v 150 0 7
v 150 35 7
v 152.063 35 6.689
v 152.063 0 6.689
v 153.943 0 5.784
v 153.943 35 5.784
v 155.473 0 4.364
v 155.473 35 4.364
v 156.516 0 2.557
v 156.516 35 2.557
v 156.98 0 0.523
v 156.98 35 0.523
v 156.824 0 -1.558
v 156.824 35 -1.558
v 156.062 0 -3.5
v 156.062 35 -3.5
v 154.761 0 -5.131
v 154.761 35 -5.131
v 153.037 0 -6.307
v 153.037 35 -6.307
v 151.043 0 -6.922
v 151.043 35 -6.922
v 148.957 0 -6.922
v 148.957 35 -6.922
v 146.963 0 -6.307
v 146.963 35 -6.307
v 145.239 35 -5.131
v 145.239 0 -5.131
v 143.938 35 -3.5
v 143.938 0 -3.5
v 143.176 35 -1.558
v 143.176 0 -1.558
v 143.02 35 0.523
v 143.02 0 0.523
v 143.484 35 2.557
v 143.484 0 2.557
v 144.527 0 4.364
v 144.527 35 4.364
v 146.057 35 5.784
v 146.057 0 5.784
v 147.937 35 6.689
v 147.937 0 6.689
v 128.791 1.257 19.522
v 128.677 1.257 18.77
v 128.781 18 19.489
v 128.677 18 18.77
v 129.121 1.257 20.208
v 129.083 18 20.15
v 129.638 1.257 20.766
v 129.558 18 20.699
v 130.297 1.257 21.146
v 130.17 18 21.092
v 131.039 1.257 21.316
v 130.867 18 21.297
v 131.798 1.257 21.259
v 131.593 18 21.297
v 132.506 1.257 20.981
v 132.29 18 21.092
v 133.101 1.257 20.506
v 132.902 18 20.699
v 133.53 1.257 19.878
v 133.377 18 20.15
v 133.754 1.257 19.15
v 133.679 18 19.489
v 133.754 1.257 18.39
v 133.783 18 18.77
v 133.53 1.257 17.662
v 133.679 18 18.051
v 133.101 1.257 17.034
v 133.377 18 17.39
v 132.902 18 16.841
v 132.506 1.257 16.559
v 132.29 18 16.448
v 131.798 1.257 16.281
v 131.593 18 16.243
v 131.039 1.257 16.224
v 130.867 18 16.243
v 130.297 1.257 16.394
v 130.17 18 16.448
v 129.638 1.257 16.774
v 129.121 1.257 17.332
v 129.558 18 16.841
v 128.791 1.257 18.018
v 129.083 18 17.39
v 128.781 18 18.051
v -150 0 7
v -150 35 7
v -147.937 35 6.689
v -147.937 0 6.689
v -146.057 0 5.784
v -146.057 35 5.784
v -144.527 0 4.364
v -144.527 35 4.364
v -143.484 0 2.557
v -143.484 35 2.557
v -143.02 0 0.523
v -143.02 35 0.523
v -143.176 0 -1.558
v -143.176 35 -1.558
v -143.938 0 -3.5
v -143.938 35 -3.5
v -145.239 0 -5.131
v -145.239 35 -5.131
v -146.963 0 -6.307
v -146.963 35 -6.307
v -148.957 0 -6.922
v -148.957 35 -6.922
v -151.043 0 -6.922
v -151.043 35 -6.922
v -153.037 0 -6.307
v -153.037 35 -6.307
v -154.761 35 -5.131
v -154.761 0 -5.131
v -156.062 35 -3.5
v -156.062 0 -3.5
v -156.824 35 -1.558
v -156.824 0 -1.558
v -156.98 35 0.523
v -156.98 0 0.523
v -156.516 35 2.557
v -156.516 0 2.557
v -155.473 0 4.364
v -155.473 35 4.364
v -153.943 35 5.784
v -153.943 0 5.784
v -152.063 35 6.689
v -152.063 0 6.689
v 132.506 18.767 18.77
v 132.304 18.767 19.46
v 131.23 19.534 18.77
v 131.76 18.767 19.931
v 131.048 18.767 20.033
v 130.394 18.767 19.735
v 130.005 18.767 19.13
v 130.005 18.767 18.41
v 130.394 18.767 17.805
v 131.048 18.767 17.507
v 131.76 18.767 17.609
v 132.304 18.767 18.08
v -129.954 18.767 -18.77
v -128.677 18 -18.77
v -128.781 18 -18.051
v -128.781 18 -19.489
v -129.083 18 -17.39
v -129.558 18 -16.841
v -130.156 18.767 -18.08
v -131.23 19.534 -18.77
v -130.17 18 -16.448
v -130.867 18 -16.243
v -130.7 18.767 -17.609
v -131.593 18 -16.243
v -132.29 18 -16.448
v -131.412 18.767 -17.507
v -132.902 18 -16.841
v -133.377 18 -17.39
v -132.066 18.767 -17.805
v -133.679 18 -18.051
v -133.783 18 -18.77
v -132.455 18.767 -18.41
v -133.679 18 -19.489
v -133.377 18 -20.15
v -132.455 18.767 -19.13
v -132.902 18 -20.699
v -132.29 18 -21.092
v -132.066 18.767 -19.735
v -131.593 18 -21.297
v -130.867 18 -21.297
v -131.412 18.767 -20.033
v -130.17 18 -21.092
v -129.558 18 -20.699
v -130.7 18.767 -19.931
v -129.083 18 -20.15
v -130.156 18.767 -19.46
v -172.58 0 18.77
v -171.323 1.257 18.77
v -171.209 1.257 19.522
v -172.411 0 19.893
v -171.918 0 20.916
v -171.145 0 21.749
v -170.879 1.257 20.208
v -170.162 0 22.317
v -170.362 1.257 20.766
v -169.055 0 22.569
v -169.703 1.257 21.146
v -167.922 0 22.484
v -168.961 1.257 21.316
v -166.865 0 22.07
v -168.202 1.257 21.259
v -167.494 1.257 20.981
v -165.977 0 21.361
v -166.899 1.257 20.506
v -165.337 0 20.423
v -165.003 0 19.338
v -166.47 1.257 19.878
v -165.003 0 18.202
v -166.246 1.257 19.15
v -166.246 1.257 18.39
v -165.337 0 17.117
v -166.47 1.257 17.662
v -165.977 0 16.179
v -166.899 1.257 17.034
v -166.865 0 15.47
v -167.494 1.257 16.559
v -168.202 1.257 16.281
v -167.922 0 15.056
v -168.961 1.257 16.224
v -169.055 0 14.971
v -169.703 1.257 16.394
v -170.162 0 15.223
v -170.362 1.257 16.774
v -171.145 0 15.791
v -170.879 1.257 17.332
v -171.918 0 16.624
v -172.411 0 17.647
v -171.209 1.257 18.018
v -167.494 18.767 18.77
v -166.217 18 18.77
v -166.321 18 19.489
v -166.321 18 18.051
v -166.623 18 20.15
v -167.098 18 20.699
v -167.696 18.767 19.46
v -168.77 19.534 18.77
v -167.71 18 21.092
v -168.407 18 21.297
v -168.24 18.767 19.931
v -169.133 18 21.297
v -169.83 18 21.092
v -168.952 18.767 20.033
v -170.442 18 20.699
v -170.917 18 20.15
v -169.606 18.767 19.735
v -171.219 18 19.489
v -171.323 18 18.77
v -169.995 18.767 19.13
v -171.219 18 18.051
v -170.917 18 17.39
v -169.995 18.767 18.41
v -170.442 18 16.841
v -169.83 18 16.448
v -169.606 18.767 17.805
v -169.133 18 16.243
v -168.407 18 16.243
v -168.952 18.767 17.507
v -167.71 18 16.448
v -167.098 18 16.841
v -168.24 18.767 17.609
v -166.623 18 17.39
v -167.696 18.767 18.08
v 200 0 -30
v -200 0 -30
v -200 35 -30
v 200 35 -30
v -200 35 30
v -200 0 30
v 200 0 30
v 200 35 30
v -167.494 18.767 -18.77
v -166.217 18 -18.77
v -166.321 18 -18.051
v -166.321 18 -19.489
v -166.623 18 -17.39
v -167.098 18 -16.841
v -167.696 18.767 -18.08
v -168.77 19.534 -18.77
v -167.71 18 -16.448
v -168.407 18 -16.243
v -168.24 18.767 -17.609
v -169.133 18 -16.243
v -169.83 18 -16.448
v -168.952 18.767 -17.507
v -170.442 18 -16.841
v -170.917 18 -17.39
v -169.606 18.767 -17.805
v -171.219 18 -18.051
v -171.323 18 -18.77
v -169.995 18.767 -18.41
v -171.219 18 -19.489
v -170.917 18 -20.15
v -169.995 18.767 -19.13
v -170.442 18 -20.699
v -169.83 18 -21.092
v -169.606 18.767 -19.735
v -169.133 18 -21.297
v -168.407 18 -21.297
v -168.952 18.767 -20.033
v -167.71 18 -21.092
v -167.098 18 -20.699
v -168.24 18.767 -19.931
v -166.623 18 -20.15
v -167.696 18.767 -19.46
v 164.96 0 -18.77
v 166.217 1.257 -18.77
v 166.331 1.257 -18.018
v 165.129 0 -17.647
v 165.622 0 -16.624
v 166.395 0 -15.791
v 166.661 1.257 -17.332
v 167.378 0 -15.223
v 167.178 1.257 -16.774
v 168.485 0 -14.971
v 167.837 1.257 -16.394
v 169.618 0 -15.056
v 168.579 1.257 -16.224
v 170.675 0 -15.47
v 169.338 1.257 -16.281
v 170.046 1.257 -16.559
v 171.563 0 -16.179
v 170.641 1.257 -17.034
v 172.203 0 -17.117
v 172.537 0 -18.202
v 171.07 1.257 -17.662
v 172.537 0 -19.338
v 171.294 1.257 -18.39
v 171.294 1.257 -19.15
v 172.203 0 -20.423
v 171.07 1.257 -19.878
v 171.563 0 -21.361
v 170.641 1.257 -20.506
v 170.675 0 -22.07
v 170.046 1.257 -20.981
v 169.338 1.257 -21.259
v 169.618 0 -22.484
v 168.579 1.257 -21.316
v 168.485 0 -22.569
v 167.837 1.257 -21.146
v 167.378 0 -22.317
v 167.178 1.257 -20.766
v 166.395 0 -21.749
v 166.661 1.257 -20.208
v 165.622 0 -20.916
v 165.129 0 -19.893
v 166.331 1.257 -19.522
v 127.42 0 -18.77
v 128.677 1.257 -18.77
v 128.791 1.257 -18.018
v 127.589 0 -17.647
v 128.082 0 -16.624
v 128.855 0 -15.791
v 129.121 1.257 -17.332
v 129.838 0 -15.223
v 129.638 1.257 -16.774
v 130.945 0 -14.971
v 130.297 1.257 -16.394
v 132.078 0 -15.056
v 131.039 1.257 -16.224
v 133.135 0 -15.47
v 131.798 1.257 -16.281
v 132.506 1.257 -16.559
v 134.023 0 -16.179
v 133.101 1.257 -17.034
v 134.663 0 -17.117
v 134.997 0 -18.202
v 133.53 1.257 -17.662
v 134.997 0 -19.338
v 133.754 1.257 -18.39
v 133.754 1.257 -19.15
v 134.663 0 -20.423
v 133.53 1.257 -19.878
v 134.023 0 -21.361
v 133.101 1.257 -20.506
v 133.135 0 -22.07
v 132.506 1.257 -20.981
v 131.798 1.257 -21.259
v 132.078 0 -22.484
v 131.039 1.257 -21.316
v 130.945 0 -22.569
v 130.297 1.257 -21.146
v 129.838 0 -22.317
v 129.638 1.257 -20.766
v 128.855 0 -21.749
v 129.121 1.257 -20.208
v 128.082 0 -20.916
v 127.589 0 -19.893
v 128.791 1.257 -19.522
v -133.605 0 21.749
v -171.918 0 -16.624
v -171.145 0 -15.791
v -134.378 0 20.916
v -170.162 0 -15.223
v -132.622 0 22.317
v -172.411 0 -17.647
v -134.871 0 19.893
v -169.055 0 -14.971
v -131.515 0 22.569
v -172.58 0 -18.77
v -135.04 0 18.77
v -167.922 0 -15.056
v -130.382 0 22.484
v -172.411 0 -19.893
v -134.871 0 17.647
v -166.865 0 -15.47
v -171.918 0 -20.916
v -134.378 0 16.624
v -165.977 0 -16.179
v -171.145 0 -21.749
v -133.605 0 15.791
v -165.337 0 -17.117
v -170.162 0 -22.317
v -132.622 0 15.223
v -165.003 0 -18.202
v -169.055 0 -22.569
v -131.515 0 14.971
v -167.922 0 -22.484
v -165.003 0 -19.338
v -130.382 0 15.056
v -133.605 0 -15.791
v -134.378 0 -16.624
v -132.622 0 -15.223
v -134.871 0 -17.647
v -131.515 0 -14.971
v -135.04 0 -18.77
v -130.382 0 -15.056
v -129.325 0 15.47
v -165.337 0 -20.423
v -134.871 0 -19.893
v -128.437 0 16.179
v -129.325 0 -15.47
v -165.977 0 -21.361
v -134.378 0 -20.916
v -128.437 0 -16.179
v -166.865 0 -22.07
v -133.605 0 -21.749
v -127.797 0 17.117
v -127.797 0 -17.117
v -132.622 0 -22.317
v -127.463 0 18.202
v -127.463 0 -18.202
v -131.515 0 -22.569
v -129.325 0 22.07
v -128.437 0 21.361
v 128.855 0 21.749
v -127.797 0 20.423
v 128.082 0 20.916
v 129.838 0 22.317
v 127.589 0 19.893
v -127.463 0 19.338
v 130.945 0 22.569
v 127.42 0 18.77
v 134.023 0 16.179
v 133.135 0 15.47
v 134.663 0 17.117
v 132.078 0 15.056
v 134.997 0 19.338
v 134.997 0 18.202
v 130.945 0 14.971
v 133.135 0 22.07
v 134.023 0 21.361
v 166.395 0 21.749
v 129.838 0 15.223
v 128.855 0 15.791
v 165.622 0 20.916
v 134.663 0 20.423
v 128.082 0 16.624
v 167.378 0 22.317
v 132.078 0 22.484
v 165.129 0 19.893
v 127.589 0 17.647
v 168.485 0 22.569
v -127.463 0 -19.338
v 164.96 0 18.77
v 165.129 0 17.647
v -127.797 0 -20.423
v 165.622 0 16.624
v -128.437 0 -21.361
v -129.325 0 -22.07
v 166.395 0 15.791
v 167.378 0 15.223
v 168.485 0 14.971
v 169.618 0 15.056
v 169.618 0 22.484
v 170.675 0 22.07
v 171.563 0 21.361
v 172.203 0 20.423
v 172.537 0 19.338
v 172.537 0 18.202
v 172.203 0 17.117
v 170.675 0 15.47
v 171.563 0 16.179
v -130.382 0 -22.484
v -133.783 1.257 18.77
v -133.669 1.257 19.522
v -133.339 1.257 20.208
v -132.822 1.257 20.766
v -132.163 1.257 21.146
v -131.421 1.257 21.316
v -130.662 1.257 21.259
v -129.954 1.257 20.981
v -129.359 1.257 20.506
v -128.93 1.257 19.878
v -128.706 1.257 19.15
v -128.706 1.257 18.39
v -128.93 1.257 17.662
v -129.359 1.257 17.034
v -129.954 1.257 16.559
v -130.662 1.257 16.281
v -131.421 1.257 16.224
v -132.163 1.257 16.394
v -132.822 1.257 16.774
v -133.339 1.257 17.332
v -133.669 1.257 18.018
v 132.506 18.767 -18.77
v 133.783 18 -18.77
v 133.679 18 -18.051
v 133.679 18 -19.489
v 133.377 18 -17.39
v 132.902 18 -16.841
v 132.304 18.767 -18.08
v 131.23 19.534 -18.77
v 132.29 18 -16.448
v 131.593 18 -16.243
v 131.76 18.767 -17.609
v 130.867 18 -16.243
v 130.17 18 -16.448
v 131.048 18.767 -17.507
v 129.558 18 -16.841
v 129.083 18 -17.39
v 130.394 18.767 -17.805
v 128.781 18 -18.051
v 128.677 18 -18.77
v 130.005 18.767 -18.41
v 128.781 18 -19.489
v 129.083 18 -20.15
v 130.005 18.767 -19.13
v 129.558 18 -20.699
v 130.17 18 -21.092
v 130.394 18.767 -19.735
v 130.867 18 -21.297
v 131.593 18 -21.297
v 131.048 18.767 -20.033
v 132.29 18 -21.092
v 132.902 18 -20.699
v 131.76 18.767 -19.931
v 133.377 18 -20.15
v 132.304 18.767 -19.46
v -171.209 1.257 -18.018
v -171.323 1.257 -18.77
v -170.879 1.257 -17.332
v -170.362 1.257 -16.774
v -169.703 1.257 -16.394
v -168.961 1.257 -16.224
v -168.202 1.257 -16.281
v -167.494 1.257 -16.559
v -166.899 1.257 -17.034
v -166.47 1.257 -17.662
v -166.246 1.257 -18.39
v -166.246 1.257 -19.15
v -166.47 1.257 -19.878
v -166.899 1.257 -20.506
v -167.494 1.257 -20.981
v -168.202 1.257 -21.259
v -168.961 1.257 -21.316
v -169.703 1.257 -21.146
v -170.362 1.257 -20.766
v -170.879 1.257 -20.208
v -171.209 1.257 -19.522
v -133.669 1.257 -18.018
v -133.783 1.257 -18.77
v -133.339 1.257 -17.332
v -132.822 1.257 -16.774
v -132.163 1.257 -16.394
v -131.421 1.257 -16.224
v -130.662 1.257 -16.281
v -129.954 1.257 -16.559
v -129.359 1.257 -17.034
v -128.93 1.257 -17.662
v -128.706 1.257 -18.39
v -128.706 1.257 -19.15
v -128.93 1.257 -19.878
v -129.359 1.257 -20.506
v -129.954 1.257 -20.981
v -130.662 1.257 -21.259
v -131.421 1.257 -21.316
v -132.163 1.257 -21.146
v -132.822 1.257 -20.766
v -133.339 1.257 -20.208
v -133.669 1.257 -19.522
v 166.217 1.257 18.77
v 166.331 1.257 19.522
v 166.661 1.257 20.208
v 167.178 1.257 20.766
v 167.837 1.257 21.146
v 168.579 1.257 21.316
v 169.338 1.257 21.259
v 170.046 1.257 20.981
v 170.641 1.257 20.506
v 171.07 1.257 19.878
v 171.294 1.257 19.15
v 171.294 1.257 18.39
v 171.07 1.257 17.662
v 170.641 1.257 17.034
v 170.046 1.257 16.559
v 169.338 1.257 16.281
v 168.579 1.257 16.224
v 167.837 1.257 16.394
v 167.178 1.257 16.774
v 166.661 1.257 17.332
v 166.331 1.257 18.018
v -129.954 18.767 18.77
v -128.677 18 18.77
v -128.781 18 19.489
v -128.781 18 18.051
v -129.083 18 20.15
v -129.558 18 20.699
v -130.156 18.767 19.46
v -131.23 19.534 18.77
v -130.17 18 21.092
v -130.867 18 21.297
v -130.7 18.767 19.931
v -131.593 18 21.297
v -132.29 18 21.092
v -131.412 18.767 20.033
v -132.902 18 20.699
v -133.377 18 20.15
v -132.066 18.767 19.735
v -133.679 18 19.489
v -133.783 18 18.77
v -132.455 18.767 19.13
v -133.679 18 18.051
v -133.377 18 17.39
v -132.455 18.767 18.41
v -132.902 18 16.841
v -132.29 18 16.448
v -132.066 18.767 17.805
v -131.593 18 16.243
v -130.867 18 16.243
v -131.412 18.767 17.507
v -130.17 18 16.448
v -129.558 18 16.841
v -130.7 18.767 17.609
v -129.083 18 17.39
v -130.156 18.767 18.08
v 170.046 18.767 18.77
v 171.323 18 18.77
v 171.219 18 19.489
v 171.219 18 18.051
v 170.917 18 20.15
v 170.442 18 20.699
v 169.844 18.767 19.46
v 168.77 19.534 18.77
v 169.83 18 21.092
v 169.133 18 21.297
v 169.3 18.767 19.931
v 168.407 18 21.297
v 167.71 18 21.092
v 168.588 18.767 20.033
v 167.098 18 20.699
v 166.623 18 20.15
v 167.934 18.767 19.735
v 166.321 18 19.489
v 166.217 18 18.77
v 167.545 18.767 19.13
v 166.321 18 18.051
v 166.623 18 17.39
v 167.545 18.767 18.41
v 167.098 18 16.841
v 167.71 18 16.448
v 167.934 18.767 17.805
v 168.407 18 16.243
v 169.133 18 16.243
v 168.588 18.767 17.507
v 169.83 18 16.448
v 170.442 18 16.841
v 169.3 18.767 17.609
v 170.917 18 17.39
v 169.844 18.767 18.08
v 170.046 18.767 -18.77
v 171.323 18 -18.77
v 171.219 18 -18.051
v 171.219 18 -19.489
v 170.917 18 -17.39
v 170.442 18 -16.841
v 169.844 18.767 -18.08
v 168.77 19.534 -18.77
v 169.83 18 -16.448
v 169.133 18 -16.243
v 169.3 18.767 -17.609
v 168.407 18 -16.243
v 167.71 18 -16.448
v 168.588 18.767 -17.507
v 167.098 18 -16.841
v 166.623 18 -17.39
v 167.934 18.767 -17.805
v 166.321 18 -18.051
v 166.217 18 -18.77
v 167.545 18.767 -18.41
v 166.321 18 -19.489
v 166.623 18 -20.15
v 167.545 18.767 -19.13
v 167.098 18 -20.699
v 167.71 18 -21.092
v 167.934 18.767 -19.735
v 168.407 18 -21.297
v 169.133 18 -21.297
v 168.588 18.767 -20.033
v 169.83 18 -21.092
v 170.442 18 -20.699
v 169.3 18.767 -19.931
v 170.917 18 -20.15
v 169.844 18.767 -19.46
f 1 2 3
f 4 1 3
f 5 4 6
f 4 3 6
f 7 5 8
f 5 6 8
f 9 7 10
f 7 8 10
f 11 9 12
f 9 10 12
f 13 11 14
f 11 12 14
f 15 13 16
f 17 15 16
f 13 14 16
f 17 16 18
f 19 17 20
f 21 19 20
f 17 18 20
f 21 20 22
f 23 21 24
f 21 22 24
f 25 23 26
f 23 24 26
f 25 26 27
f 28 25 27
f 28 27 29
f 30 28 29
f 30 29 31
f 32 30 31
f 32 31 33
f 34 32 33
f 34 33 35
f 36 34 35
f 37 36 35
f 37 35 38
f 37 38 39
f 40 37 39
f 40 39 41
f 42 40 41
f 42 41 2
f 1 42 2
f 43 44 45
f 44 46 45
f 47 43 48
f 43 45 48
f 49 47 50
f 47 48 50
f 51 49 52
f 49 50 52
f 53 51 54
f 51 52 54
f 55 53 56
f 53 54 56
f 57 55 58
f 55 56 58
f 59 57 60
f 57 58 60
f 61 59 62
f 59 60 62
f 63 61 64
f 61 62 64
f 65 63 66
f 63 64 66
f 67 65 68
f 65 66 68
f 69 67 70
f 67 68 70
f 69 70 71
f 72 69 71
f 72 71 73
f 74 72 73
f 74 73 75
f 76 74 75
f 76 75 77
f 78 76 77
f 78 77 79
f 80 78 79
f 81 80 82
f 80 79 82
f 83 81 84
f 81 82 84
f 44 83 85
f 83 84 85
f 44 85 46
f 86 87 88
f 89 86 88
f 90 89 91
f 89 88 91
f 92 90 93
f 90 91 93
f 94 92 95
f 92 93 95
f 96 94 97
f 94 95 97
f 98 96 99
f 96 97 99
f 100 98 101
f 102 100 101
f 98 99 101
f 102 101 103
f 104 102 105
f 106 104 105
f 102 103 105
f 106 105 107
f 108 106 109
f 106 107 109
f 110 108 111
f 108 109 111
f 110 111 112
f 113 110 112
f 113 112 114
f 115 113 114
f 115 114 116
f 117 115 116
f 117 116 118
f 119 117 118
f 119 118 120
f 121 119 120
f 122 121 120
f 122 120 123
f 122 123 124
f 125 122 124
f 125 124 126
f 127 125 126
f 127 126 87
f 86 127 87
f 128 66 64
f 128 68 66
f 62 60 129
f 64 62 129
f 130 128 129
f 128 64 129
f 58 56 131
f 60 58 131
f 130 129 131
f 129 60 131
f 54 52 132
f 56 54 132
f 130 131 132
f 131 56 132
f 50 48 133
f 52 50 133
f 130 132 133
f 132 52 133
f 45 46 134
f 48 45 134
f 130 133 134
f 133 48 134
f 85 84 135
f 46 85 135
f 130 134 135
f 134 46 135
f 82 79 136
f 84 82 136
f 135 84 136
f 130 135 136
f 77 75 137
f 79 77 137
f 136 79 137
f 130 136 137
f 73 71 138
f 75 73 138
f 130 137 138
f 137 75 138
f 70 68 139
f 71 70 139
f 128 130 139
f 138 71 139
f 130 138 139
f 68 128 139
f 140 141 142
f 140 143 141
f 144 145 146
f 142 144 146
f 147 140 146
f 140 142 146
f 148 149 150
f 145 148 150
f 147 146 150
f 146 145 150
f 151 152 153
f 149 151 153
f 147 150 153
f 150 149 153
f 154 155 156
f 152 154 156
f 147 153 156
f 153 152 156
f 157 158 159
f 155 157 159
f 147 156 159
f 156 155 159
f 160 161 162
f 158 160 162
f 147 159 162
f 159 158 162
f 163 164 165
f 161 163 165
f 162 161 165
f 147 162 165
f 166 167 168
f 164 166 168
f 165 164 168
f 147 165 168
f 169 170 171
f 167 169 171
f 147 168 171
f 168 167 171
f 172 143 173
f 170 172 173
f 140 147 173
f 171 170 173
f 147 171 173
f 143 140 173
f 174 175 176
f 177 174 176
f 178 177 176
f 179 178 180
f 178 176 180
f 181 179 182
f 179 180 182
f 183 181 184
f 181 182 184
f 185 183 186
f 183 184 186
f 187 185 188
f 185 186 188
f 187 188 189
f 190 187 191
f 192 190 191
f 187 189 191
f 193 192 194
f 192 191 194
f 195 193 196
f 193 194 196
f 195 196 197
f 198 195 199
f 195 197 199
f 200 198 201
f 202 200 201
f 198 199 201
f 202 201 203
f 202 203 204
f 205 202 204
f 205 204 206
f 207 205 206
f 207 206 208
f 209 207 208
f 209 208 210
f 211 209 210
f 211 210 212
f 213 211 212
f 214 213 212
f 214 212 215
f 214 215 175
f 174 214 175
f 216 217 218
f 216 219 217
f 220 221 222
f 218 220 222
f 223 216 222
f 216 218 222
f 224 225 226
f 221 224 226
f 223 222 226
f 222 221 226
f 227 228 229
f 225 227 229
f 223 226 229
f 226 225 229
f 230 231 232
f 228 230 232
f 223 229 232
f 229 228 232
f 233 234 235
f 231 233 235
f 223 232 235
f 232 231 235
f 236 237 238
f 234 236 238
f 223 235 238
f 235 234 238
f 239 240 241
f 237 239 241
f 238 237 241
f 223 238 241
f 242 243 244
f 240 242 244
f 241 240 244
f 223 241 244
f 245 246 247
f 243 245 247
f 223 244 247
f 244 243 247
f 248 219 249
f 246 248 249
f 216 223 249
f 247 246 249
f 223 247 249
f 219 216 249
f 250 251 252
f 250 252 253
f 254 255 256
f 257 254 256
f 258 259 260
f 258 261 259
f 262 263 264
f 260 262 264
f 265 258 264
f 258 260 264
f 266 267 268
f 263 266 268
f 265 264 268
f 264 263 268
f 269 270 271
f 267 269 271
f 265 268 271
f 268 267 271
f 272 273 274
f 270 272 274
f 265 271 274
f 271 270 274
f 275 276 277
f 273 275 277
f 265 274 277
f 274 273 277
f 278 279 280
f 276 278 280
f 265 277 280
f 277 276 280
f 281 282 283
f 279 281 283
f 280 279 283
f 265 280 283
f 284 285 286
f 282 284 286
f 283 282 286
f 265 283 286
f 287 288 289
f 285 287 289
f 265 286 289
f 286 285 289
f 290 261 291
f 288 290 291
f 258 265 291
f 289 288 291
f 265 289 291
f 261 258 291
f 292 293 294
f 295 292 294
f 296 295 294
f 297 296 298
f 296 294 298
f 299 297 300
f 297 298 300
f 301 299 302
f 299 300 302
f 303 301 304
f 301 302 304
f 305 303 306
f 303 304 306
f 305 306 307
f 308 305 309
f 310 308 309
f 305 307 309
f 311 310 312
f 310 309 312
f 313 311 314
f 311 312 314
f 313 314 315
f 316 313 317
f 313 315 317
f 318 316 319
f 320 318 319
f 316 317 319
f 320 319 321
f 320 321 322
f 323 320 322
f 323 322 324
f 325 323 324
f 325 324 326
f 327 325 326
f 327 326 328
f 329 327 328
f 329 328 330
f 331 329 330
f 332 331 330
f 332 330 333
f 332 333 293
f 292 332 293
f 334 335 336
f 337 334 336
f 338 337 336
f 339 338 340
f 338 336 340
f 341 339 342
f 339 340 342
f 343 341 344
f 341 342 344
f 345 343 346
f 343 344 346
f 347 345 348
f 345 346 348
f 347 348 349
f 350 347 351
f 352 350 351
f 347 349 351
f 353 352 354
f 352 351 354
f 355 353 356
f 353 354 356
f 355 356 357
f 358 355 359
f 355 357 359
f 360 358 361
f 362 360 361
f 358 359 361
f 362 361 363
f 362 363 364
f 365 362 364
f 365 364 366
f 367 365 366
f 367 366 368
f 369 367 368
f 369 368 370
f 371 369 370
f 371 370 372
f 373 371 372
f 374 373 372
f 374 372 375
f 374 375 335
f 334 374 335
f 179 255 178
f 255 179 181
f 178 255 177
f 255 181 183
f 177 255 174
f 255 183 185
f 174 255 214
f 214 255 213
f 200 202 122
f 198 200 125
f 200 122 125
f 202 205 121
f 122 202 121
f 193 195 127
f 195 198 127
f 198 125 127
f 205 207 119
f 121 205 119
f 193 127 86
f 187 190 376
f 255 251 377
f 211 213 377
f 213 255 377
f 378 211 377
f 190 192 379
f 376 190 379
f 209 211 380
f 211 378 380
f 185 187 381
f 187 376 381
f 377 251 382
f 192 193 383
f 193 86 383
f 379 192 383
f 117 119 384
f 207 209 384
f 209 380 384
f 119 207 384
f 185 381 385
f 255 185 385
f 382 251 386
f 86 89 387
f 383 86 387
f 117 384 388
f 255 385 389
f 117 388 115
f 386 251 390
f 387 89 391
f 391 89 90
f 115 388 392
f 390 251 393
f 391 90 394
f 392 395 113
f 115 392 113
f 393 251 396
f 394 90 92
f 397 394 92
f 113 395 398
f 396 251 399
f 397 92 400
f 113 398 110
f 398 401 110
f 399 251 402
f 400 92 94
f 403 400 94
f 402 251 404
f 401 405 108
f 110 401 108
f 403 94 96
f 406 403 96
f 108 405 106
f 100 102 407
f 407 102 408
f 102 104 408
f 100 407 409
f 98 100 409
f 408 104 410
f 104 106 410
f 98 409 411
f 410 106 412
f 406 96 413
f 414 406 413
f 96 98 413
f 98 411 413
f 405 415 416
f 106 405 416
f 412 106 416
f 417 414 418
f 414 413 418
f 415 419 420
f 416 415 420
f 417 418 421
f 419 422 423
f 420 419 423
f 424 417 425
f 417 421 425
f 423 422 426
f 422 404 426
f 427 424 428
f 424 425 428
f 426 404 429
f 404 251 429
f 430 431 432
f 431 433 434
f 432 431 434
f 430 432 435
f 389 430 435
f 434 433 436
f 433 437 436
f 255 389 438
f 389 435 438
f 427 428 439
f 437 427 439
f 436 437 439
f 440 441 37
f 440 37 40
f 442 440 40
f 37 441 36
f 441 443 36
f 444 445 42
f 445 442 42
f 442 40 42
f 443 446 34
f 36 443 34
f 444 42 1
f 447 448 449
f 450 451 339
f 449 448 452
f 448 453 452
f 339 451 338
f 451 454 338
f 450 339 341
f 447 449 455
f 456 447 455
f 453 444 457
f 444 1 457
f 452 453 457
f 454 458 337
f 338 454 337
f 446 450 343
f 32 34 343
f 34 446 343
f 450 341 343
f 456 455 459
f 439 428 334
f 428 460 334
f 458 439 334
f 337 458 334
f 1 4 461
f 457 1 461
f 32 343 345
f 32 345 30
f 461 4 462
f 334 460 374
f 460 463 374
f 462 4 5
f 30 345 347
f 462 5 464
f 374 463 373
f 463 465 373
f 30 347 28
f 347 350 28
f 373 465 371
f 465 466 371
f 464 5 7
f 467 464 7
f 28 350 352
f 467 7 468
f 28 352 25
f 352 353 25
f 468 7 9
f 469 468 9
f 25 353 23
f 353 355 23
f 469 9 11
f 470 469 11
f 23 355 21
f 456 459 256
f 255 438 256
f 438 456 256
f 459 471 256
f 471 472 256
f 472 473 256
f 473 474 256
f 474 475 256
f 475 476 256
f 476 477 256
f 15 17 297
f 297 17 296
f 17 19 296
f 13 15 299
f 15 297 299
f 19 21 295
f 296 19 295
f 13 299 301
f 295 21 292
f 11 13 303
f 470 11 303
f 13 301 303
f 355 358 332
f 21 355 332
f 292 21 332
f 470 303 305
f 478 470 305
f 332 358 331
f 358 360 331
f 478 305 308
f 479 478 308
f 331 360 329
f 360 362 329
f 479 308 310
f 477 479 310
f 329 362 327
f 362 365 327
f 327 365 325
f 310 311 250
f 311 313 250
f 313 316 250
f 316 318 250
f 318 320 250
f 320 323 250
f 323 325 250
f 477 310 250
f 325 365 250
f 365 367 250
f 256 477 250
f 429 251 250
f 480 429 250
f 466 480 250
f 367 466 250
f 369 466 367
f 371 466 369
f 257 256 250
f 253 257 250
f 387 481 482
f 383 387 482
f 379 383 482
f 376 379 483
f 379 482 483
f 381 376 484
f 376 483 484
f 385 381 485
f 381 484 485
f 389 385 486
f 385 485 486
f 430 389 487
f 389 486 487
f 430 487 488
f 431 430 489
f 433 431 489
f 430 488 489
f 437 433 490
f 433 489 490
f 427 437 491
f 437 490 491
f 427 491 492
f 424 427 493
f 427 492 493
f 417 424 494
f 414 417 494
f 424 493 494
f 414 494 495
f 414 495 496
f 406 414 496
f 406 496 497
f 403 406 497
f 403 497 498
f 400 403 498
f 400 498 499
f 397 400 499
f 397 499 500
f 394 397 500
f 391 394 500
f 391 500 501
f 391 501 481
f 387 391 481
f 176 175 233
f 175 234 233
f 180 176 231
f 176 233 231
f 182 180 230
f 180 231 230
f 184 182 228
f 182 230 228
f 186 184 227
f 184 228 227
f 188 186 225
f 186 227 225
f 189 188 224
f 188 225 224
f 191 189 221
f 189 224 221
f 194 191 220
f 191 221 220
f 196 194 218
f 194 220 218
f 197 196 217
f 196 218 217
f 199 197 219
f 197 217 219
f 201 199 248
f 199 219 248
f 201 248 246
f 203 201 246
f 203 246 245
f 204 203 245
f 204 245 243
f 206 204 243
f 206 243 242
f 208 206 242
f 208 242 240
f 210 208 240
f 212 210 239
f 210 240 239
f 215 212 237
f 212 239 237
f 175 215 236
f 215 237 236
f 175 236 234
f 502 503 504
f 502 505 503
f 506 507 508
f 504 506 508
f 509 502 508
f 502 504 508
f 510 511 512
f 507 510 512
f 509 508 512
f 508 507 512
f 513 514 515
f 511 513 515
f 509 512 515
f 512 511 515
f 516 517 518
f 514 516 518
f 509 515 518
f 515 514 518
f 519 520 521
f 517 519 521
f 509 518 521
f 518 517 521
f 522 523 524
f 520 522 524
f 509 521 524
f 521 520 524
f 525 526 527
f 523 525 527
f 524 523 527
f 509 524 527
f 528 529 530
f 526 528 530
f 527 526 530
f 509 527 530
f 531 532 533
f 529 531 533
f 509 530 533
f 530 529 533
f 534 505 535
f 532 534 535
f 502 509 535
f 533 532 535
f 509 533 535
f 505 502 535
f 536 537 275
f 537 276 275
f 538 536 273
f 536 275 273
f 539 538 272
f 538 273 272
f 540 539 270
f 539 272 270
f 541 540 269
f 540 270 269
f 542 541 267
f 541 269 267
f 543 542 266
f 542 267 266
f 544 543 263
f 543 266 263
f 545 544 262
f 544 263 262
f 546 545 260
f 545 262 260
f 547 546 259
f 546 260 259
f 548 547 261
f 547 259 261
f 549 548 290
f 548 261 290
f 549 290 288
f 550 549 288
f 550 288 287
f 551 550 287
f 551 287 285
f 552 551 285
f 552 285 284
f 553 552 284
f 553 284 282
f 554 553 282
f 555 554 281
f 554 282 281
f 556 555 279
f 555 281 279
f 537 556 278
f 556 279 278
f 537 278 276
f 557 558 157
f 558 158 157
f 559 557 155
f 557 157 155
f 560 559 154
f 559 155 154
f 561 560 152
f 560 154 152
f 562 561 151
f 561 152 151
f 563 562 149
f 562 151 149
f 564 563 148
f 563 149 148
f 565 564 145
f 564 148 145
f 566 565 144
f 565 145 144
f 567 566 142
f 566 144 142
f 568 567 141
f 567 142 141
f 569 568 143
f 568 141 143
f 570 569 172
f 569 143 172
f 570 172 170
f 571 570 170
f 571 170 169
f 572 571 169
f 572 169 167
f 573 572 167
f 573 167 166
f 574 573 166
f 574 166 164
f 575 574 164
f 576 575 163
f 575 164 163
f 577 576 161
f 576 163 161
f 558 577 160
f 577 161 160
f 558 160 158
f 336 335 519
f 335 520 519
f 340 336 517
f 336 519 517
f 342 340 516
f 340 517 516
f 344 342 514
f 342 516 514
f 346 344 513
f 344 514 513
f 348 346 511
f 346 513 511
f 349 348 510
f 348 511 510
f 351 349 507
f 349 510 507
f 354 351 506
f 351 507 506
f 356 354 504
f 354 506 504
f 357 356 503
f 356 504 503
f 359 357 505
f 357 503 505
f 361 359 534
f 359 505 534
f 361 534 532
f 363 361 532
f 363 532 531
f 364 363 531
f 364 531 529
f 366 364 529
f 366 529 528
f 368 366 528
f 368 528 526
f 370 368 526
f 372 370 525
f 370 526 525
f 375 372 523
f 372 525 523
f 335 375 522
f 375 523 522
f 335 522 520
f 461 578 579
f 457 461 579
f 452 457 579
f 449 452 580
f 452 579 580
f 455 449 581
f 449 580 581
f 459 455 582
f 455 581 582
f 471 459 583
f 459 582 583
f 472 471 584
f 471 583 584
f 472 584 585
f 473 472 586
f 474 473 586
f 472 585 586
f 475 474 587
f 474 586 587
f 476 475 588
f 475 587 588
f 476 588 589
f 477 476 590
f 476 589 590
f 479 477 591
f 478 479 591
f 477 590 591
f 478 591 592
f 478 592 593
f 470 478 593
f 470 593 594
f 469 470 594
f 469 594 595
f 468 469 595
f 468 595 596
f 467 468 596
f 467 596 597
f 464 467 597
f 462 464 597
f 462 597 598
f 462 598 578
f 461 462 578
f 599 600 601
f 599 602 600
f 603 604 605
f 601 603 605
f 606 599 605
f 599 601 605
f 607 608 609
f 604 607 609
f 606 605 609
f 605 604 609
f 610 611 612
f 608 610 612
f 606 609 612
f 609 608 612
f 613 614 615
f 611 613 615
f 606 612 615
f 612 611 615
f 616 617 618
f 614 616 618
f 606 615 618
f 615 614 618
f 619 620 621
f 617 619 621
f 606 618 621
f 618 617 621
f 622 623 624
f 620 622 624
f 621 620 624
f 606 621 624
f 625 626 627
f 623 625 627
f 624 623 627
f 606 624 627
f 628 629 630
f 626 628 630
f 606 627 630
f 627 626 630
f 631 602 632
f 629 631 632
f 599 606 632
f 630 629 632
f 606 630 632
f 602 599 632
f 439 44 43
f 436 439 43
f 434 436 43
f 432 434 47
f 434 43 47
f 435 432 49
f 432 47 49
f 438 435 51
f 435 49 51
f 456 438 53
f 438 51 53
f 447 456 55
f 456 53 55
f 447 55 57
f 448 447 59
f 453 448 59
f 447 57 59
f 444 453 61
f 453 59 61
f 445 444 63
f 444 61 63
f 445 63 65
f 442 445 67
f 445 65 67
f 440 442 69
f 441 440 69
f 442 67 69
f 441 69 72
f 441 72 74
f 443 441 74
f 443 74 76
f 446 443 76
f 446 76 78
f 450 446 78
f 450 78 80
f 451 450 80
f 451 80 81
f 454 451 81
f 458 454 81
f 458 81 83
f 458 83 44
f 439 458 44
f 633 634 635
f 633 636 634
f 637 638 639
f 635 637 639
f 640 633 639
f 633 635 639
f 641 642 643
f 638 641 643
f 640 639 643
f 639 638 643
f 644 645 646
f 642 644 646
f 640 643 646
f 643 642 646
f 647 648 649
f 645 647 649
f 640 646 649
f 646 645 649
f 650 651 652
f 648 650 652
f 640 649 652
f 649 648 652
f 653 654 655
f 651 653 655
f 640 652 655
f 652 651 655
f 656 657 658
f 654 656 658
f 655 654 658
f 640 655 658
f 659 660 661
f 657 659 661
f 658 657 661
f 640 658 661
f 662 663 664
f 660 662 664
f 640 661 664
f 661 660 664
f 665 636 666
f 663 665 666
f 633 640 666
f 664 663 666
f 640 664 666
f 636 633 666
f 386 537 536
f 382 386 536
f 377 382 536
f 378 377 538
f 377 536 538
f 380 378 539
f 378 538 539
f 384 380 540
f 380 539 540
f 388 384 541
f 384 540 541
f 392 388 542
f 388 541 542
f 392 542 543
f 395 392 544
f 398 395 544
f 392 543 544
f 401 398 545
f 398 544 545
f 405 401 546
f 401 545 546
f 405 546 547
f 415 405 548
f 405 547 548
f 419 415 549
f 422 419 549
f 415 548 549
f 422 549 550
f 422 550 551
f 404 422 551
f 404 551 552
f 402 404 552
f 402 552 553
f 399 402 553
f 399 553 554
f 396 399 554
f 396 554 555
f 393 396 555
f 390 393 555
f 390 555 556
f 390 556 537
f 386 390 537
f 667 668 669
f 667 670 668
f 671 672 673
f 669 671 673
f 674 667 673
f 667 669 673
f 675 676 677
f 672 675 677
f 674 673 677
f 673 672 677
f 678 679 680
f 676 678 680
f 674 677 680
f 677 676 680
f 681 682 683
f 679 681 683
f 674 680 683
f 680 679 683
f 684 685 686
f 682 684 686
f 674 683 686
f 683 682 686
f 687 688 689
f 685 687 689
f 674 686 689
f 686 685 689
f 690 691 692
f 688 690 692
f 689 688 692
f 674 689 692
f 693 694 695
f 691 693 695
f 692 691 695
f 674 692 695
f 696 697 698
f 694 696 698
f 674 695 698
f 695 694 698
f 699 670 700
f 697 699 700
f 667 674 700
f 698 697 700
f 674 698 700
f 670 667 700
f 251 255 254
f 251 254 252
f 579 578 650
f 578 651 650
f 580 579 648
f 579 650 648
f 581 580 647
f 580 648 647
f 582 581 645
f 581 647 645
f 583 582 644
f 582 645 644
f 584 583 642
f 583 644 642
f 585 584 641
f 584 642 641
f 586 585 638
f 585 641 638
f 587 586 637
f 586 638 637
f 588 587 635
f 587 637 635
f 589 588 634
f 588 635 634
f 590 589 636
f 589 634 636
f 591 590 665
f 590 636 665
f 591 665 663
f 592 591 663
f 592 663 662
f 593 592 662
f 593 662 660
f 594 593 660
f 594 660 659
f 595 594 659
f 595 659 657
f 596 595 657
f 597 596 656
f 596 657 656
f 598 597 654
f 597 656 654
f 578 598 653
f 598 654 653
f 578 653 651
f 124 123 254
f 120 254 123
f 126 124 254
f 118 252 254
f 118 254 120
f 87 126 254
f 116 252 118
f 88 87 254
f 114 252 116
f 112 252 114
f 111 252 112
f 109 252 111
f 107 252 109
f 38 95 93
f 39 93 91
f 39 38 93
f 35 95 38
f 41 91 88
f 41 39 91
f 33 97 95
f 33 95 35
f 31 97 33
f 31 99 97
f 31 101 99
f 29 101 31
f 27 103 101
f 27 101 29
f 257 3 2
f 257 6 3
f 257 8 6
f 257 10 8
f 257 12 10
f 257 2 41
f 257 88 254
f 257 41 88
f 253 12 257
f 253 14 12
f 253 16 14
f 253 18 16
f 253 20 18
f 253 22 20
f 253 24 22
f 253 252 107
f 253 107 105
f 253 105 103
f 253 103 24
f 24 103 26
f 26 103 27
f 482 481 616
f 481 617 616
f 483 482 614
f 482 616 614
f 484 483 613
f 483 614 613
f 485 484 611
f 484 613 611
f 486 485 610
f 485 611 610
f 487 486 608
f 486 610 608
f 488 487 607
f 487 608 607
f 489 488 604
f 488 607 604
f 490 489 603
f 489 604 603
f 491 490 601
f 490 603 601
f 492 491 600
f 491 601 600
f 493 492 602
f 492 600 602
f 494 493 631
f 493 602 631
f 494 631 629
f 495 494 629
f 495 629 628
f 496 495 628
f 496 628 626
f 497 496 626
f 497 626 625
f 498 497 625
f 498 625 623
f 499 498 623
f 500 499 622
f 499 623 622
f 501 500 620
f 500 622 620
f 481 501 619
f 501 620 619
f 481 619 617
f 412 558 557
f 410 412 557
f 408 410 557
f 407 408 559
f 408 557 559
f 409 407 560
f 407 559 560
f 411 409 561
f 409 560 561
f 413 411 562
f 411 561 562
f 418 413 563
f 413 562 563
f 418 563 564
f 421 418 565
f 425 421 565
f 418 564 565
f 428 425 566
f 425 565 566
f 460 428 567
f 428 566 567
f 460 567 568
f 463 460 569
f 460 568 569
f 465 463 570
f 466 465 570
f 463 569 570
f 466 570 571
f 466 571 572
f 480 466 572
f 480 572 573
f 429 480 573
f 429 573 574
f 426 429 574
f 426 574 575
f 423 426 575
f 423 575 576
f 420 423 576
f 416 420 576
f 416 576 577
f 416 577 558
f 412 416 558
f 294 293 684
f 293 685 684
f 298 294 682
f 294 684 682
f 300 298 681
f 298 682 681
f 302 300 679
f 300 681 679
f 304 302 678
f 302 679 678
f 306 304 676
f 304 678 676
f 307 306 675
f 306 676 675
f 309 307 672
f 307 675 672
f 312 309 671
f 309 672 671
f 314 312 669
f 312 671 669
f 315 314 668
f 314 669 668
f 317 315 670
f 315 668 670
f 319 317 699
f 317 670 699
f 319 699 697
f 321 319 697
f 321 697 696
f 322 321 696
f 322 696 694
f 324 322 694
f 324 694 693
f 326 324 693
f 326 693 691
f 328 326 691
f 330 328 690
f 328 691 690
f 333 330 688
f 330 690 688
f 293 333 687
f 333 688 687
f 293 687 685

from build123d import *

# Parameters (mm, degrees)
SKETCH1_W                         = 400
SKETCH1_H                         = 60
BOSS_EXTRUDE1_DEPTH               = 35
SKETCH2_R                         = 7
CUT_EXTRUDE1_DEPTH                = 206.243757518
F_1_4_20_TAPPED_HOLE1_D           = 5.1054
F_1_4_20_TAPPED_HOLE1_DEPTH       = 18
F_1_4_20_TAPPED_HOLE1_CSINK_D     = 7.62
F_1_4_20_TAPPED_HOLE1_CSINK_ANGLE = 90
F_1_4_20_TAPPED_HOLE1_TIP         = 1.533816902


with BuildPart() as part:
    # Sketch1 → Boss-Extrude1 (new body)
    with BuildSketch(Plane(origin=(0, 0, 0), x_dir=(1, 0, 0), z_dir=(0, 1, 0))):
        Rectangle(SKETCH1_W, SKETCH1_H)
    extrude(amount=BOSS_EXTRUDE1_DEPTH)

    # Sketch2 → Cut-Extrude1 (cut, through all)
    with BuildSketch(Plane(origin=(0, 35, 0), x_dir=(1, 0, 0), z_dir=(0, 1, 0))):
        with Locations(Location((-150, 0, 0), (0, 0, 270))):
            Circle(SKETCH2_R)
        with Locations(Location((150, 0, 0), (0, 0, 270))):
            Circle(SKETCH2_R)
    extrude(amount=-CUT_EXTRUDE1_DEPTH, mode=Mode.SUBTRACT)

    # 1/4-20 Tapped Hole1
    with Locations(Plane.XZ):
        with Locations((-168.77, 18.77), (-131.23, 18.77), (-131.23, -18.77), (-168.77, -18.77), (131.23, 18.77), (168.77, 18.77), (168.77, -18.77), (131.23, -18.77)):
            CounterSinkHole(F_1_4_20_TAPPED_HOLE1_D / 2, F_1_4_20_TAPPED_HOLE1_CSINK_D / 2, depth=F_1_4_20_TAPPED_HOLE1_DEPTH, counter_sink_angle=F_1_4_20_TAPPED_HOLE1_CSINK_ANGLE)
            with Locations((0, 0, -(F_1_4_20_TAPPED_HOLE1_DEPTH + F_1_4_20_TAPPED_HOLE1_TIP / 2))):  # 118° drill point
                Cone(0, F_1_4_20_TAPPED_HOLE1_D / 2, F_1_4_20_TAPPED_HOLE1_TIP, mode=Mode.SUBTRACT)


solid = part.part
